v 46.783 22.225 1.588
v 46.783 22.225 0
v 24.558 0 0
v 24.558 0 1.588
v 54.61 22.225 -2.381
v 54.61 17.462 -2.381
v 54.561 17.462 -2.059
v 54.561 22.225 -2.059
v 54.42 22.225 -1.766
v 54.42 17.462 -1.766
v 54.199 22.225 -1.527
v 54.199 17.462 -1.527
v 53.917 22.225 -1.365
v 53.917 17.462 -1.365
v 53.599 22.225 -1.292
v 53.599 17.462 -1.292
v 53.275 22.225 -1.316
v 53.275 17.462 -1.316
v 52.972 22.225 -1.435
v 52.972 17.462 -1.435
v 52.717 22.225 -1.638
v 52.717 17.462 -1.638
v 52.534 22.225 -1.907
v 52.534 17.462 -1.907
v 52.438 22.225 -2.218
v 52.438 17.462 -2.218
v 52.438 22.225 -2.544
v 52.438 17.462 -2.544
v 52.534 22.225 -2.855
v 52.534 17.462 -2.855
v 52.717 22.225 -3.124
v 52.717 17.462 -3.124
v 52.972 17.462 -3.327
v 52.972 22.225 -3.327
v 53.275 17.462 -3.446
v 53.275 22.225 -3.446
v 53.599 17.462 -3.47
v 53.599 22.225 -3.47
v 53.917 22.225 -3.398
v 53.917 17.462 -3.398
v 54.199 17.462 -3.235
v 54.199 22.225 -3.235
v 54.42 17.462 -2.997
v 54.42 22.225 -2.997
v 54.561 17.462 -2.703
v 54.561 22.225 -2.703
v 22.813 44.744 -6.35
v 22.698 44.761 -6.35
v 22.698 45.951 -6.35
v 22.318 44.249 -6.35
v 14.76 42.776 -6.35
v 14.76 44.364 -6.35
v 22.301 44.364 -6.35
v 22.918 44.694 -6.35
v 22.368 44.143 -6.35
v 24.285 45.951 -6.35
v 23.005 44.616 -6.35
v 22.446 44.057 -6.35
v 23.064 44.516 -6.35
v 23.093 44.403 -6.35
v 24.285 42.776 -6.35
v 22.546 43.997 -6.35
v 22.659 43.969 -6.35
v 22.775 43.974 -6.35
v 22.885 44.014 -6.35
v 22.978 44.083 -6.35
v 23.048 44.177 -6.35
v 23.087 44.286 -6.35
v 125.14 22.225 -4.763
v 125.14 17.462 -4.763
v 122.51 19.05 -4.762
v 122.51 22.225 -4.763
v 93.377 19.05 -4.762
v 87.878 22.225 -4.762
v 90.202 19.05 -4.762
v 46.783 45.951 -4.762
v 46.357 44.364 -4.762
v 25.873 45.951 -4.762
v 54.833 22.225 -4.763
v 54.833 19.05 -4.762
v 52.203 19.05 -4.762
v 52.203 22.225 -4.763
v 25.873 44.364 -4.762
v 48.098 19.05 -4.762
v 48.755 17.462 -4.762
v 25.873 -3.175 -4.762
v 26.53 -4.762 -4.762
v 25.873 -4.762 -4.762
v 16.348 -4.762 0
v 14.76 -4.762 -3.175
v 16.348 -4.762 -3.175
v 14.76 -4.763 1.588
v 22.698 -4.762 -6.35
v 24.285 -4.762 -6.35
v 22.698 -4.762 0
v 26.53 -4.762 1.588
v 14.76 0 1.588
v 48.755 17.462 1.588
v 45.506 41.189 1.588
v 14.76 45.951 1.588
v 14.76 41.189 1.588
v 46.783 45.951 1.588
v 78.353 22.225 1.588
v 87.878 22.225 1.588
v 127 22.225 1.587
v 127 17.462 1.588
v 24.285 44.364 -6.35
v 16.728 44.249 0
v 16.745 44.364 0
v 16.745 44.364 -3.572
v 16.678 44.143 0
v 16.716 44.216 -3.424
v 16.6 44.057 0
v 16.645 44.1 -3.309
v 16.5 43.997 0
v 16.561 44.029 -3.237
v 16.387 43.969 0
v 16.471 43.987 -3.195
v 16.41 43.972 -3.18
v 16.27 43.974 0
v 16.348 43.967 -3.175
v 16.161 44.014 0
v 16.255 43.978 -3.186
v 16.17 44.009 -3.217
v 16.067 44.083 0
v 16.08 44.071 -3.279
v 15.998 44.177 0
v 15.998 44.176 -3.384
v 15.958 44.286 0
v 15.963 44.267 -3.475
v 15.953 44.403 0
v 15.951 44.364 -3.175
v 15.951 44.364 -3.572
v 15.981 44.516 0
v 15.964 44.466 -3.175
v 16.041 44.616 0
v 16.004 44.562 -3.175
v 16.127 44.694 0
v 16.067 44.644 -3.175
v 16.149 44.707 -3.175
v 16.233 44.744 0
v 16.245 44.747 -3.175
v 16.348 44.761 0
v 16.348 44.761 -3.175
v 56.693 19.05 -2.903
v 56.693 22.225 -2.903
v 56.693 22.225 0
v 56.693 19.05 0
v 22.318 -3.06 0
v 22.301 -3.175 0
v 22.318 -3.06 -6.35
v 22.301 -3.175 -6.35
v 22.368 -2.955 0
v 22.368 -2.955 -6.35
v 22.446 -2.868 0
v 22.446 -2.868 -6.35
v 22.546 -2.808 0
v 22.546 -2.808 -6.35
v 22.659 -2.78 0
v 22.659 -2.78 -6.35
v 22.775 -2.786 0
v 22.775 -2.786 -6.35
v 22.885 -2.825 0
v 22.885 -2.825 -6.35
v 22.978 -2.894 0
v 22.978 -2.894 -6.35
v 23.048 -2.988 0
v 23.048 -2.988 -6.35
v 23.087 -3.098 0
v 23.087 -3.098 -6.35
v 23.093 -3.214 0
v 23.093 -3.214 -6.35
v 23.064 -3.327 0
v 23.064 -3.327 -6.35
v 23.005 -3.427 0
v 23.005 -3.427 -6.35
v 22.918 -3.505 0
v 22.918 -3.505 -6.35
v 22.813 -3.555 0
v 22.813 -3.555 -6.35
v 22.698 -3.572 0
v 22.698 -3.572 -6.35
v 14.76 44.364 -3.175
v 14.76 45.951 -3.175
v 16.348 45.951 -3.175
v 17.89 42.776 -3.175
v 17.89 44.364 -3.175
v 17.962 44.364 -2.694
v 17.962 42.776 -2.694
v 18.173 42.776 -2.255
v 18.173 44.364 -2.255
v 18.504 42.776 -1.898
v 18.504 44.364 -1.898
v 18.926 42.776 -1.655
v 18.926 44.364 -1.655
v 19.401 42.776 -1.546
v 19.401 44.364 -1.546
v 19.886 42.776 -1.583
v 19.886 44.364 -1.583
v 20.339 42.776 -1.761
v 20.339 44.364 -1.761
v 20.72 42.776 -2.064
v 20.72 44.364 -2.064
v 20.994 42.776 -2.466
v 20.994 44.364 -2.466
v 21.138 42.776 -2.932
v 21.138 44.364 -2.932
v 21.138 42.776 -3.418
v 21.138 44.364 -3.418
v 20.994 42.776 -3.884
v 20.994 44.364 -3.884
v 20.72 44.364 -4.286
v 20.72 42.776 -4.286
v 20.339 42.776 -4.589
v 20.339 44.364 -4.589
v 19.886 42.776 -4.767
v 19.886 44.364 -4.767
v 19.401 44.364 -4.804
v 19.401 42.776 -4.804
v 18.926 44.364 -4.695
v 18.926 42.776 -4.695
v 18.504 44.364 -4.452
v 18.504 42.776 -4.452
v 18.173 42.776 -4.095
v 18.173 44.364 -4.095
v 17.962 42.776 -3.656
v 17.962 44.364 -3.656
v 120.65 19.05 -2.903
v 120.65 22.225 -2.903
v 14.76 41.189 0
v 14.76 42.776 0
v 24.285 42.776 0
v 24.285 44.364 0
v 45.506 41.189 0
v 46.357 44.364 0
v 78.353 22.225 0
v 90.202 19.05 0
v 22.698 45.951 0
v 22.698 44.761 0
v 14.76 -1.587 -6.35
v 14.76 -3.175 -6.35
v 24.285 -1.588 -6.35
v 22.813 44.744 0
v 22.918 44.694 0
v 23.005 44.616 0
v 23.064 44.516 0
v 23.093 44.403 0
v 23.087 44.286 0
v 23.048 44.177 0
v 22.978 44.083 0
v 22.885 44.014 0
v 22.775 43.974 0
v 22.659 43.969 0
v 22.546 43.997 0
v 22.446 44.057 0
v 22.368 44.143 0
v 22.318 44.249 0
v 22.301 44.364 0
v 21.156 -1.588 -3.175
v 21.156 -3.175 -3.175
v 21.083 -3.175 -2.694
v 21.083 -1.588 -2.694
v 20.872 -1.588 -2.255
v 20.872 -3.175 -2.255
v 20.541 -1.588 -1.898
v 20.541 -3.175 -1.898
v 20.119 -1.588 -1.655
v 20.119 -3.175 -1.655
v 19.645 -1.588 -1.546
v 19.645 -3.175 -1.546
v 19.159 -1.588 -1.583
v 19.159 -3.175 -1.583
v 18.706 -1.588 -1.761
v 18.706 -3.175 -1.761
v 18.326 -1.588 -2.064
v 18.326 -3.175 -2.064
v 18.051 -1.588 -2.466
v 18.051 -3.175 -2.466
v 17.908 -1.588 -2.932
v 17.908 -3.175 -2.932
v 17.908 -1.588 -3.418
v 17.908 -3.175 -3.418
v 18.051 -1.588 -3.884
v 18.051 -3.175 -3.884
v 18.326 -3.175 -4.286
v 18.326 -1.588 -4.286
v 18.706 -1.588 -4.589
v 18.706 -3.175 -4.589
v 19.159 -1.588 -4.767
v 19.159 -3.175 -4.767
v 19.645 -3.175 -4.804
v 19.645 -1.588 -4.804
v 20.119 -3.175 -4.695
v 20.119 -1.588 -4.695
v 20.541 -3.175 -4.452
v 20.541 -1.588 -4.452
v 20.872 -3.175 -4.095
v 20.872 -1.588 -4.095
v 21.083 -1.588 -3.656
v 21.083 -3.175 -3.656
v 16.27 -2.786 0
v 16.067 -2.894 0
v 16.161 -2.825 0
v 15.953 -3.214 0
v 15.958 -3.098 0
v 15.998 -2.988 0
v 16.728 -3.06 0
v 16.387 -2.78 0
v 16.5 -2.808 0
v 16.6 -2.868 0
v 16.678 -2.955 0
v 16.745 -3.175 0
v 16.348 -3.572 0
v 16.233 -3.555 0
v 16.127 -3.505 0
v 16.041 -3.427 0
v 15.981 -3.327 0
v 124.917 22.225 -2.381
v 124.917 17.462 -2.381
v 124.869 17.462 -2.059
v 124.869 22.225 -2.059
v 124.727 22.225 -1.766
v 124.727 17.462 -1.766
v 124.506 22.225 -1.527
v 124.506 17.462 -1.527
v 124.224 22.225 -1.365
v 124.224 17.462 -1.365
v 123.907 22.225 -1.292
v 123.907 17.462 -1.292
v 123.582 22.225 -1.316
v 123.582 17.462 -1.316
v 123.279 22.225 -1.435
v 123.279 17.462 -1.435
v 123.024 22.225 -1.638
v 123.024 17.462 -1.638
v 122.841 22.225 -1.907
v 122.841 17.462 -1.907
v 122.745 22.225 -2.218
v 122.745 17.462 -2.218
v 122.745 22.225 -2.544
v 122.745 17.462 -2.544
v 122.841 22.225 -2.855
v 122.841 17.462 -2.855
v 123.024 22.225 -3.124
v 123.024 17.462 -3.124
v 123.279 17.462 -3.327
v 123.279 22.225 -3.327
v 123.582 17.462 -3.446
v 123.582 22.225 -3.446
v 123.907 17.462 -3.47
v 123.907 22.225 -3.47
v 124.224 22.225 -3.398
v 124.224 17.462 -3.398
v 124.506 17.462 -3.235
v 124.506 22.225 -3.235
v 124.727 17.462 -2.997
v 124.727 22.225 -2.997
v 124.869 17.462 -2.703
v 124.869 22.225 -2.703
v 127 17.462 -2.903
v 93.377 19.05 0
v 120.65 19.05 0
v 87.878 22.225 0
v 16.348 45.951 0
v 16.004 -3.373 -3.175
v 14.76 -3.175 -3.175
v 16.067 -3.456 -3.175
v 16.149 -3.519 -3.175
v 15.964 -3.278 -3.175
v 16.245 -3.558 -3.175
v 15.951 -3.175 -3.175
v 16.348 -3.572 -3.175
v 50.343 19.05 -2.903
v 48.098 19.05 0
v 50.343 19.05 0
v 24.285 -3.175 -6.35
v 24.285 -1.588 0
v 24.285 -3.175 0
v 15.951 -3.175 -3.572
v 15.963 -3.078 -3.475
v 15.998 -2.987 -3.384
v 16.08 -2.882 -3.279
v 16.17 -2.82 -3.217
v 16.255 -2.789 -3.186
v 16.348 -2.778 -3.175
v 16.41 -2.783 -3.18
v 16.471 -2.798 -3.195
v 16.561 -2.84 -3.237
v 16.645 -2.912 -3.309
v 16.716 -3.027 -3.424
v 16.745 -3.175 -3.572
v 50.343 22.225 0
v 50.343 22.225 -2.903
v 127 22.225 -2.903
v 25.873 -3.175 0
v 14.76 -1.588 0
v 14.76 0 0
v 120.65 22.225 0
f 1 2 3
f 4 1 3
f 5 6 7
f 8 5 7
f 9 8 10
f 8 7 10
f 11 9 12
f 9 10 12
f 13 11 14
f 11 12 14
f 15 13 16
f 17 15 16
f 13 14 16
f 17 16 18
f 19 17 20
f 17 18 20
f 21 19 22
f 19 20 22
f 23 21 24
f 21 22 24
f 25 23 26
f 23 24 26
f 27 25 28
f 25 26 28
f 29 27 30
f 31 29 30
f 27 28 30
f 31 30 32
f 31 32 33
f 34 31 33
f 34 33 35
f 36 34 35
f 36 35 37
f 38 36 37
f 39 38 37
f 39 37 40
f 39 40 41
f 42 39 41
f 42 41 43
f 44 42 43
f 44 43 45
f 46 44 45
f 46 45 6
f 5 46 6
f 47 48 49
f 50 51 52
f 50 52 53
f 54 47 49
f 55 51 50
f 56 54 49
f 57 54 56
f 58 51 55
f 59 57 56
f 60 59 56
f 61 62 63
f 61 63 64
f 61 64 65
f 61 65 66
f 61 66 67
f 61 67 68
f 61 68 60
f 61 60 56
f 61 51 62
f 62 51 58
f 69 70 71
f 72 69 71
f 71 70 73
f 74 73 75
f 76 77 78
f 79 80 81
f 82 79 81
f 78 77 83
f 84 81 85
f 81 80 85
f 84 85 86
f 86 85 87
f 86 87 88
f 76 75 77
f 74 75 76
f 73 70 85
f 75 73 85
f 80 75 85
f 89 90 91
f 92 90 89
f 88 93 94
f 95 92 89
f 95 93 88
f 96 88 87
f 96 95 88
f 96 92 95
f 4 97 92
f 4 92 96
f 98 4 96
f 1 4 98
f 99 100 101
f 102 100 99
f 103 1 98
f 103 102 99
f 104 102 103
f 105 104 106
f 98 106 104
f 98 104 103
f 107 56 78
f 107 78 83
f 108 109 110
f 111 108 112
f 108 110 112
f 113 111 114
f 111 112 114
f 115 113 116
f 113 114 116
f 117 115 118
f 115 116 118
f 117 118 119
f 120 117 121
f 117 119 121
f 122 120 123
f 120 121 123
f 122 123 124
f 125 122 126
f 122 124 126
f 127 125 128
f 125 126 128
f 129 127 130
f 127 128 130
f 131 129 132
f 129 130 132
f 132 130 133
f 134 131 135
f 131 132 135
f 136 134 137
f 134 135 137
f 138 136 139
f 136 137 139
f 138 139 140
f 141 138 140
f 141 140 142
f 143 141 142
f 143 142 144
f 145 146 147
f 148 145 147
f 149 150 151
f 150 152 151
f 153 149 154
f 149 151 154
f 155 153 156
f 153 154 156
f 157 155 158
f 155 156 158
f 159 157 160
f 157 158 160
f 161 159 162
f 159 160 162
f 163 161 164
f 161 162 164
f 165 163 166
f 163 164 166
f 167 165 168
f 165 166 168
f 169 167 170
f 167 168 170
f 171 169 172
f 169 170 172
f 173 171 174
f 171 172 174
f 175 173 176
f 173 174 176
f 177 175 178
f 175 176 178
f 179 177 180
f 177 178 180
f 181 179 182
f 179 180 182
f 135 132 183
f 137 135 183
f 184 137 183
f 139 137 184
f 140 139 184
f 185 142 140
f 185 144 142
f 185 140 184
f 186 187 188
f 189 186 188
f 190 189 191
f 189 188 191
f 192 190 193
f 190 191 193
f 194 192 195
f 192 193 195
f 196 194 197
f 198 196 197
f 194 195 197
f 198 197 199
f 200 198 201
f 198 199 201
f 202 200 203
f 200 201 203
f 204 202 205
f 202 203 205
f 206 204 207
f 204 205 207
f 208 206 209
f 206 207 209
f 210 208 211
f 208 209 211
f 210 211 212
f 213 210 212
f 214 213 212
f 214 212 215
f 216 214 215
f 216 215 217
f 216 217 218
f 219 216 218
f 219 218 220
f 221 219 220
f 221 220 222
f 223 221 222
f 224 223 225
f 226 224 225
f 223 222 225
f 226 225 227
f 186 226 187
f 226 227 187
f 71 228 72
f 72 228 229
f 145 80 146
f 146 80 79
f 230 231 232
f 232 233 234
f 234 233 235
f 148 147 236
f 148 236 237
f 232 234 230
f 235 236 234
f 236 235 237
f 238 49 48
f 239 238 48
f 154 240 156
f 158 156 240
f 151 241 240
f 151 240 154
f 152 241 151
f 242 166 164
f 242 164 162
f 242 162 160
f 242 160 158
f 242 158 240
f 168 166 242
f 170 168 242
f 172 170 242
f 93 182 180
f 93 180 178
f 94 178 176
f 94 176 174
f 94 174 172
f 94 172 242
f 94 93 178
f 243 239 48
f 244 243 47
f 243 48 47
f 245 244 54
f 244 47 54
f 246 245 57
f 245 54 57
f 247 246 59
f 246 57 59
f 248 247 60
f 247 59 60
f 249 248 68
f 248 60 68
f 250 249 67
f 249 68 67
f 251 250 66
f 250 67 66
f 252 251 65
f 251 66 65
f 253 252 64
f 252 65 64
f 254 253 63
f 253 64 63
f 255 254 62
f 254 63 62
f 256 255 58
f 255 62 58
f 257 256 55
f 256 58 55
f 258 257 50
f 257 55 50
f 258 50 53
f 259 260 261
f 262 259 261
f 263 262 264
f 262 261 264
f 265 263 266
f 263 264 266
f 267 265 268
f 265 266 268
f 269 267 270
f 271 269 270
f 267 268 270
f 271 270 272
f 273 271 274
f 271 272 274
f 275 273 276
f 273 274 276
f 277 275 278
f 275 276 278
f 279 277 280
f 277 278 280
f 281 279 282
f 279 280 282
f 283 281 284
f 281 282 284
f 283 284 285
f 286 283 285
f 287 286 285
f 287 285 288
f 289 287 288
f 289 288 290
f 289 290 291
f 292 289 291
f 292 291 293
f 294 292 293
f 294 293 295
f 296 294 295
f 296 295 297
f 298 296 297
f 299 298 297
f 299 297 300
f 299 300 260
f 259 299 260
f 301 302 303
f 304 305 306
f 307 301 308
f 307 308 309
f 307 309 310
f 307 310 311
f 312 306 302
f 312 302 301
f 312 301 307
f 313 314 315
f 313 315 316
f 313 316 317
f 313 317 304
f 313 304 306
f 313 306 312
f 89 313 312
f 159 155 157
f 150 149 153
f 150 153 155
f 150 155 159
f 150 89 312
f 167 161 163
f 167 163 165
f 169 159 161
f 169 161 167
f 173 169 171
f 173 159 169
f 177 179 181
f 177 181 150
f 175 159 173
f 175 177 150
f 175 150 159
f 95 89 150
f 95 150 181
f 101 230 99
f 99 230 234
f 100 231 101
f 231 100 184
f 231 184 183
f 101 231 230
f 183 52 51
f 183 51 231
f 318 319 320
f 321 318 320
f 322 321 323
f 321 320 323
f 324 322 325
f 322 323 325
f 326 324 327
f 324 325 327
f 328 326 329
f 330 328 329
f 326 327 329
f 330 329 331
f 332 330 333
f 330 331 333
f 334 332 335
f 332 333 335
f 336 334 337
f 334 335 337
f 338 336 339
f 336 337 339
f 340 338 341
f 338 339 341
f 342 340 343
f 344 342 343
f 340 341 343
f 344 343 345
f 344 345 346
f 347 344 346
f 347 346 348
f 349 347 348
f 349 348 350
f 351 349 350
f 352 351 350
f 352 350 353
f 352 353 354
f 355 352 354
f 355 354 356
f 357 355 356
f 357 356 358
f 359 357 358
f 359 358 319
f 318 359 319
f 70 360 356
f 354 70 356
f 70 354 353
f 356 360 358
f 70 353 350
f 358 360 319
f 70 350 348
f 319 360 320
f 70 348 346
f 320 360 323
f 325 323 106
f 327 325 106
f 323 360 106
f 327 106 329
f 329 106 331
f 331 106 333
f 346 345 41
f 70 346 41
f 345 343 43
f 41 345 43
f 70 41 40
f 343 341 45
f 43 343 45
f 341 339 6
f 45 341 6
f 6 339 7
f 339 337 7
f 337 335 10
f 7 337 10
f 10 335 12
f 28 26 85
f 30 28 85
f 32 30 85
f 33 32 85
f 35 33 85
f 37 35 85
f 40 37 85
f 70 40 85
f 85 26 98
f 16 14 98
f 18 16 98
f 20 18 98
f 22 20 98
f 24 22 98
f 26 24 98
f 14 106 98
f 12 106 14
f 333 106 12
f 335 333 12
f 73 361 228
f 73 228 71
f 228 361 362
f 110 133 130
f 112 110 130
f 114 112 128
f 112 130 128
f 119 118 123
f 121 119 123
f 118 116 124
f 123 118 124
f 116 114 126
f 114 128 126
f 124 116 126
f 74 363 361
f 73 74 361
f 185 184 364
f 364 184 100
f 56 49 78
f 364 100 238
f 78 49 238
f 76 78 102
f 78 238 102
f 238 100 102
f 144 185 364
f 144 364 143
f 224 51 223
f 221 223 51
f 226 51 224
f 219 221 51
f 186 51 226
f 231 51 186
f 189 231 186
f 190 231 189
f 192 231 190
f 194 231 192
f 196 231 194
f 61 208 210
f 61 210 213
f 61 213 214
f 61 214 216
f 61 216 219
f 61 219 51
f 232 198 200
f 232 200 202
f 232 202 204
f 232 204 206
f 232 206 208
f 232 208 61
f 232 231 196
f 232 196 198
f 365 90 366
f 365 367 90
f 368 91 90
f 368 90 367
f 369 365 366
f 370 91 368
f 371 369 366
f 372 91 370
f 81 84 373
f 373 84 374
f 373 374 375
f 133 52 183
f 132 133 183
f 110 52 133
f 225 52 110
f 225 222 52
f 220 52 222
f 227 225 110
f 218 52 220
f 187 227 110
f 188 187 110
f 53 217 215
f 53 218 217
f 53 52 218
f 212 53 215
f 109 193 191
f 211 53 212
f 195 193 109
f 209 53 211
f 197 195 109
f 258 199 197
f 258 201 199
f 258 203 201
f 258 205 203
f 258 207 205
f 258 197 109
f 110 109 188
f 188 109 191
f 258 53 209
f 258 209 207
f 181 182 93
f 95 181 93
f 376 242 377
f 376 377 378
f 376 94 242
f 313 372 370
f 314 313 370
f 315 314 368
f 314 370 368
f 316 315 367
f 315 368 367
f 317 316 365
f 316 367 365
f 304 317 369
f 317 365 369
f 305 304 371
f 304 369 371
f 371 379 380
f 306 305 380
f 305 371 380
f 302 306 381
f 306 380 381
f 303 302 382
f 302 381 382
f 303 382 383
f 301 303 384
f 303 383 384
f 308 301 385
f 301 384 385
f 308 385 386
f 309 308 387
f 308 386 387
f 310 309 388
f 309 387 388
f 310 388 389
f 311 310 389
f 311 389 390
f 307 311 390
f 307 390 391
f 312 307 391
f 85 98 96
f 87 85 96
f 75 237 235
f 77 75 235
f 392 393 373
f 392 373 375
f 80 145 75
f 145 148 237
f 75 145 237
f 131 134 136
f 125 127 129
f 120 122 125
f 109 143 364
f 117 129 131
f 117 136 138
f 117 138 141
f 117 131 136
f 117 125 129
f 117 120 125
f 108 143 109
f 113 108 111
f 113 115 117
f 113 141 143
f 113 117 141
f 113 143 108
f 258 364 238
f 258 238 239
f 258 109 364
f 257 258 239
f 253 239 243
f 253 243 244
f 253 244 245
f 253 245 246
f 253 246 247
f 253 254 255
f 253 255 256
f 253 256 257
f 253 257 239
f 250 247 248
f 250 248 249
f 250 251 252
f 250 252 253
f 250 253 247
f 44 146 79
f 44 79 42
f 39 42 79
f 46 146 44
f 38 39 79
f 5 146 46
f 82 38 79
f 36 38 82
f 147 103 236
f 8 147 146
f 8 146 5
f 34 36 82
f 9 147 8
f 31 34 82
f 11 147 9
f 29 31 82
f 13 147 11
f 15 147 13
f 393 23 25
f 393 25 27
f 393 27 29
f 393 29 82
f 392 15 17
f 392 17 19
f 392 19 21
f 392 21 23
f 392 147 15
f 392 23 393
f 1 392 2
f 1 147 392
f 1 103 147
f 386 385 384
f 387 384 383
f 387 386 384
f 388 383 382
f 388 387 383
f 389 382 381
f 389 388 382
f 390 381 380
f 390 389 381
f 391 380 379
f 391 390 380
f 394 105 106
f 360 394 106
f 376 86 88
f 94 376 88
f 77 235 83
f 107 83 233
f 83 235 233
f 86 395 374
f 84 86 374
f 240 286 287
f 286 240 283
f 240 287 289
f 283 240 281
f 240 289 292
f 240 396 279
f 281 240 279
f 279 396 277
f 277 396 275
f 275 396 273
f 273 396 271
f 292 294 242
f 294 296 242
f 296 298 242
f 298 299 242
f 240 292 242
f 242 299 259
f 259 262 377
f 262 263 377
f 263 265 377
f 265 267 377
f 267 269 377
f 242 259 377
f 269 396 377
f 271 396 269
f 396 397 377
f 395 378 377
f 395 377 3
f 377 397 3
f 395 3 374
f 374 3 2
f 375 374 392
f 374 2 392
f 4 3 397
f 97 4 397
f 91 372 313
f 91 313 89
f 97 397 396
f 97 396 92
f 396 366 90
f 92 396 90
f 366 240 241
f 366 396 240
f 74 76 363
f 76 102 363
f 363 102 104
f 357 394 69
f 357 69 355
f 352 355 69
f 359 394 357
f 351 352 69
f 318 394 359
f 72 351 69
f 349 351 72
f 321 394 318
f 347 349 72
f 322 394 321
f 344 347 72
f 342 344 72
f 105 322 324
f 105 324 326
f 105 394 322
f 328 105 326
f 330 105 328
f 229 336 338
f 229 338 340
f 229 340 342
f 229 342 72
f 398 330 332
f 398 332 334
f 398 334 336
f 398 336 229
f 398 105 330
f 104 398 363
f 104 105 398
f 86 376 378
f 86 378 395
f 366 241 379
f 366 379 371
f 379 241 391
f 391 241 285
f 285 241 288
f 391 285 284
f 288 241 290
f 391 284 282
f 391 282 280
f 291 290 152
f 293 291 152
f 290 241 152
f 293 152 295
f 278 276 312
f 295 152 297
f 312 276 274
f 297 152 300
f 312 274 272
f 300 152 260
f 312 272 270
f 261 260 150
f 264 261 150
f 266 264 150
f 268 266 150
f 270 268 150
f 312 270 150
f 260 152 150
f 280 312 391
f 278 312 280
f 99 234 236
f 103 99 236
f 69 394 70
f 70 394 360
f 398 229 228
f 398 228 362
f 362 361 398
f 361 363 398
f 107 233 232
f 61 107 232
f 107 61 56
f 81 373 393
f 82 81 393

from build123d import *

# Parameters (mm, degrees)
F1_DEPTH      = 1.5875
F3_DEPTH      = 4.7625
F4_W          = 6.35
F4_H          = 6.35
F4_W_2        = 4.7625
F4_H_2        = 4.7625
F5_DEPTH      = 3.175
F6_SIZE       = 1.8598642
F7_W          = 28.575
F7_H          = 3.175
F8_DEPTH      = 1.5875
F9_W          = 6.35
F9_H          = 1.5875
F10_DEPTH     = 6.35
F11_R         = 1.0922
F11_R_2       = 1.63322
F12_DEPTH     = 25.4
F13_SIZE      = 1.58749
F14_R         = 0.396875
F15_DEPTH     = 6.35
F16_R         = 1.63322
F17_DEPTH     = 1.5875
F18_W         = 141.7602359697
F18_H         = 50.7137336135
F19_DEPTH     = 7.9375
F20_W         = 1.5875
F20_H         = 3.175
F21_DEPTH     = 1.5875
F22_R         = 0.396875
F23_DEPTH     = 3.175
F24_T4_DEPTH  = 1.4175116858
F24_S5_R      = 0.396875
F24_T6_DEPTH  = 2
F24_T10_DEPTH = 1.4175116858
F24_S11_R     = 0.396875
F24_T12_DEPTH = 2
F24_T16_DEPTH = 2.8350233717
F24_S17_R     = 0.396875
F24_T18_DEPTH = 3


# Not quite as in the source:
# - a fillet or chamfer that OpenCascade refuses, or shapes differently, is made with other operations: its cross-section is extruded or revolved along the edge and cut away or added
# - a fillet or chamfer is up to 0.001 mm smaller than in the source, because OpenCascade refuses the exact size


with BuildPart() as f1:
    # F0 (on Top) → F1 (new body)
    with BuildSketch(Plane.XY):
        Polygon((-87.87765, 22.225), (-127, 22.225), (-127, 17.4625), (-48.7553, 17.4625), (-26.5303, -4.7625), (26.5303, -4.7625), (48.7553, 17.4625), (127, 17.4625), (127, 22.225), (87.87765, 22.225), (46.7826079092, 45.9512336135), (-46.7826079092, 45.9512336135), align=None)
        Polygon((-24.5576079092, 0), (-46.7826079092, 22.225), (-78.35265, 22.225), (-45.5064998802, 41.1887336135), (45.5064998802, 41.1887336135), (78.35265, 22.225), (46.7826079092, 22.225), (24.5576079092, 0), align=None, mode=Mode.SUBTRACT)
    extrude(amount=F1_DEPTH)

    # F2 (on face) → F3 (join)
    with BuildSketch(Plane(origin=(0, 0, 0), x_dir=(1, 0, 0), z_dir=(0, 0, -1))):
        Polygon((-48.7553, -17.4625), (-127, -17.4625), (-127, -19.05), (-93.376911314, -19.05), (-87.87765, -22.225), (-46.7826079092, -45.9512336135), (46.7826079092, -45.9512336135), (87.87765, -22.225), (93.376911314, -19.05), (127, -19.05), (127, -17.4625), (48.7553, -17.4625), (26.5303, 4.7625), (-26.5303, 4.7625), align=None)
        Polygon((-48.0977359697, -19.05), (-25.8727359697, 3.175), (-4.2897640303, 3.175), (-4.2897640303, 1.5875), (24.2852359697, 1.5875), (24.2852359697, 3.175), (25.8727359697, 3.175), (48.0977359697, -19.05), (90.201911314, -19.05), (46.3572385662, -44.3637336135), (24.2852359697, -44.3637336135), (24.2852359697, -42.7762336135), (-4.2897640303, -42.7762336135), (-4.2897640303, -44.3637336135), (-46.3572385662, -44.3637336135), (-90.201911314, -19.05), align=None, mode=Mode.SUBTRACT)
    extrude(amount=F3_DEPTH)

    # F4 (on face) → F5 (join, through all)
    with BuildSketch(Plane(origin=(0, 19.05, 0), x_dir=(-1, 0, 0), z_dir=(0, 1, 0))):
        with Locations((-53.5178, -1.5875)):
            Rectangle(F4_W, F4_H)
        with Locations((-123.825, -1.5875)):
            Rectangle(F4_W, F4_H)
        with Locations((124.61875, -2.38125)):
            Rectangle(F4_W_2, F4_H_2)
        with Locations((55.89905, -2.38125)):
            Rectangle(F4_W_2, F4_H_2)
    extrude(amount=F5_DEPTH)

    # F6
    f6_edges = [f1.edges().sort_by_distance(p)[0] for p in [
        (-127, 19.84375, -4.7625),
        (-122.2375, 20.6375, -4.7625),
        (-58.2803, 20.6375, -4.7625),
        (-53.5178, 20.6375, -4.7625),
        (50.3428, 20.6375, -4.7625),
        (56.6928, 20.6375, -4.7625),
        (120.65, 20.6375, -4.7625),
        (127, 19.84375, -4.7625),
    ]]
    chamfer(f6_edges, length=F6_SIZE)

    # F7 (on face) → F8 (join)
    with BuildSketch(Plane(origin=(0, 0, -4.7625), x_dir=(1, 0, 0), z_dir=(0, 0, -1))):
        with Locations((9.9977359697, 3.175)):
            Rectangle(F7_W, F7_H)
        with Locations((9.9977359697, -44.3637336135)):
            Rectangle(F7_W, F7_H)
    extrude(amount=F8_DEPTH)

    # F9 (on face) → F10 (cut, through all)
    with BuildSketch(Plane(origin=(0, 0, -6.35), x_dir=(1, 0, 0), z_dir=(0, 0, -1))):
        with Locations((19.5227359697, 3.96875)):
            Rectangle(F9_W, F9_H)
        with Locations((19.5227359697, -45.1574836135)):
            Rectangle(F9_W, F9_H)
    extrude(amount=-F10_DEPTH, mode=Mode.SUBTRACT)

    # F11 (on face) → F12 (cut, through all)
    with BuildSketch(Plane.XZ.offset(3.175)):
        with Locations((53.5178, -2.38125)):
            Circle(F11_R)
        with Locations((123.825, -2.38125)):
            Circle(F11_R)
        with Locations((-124.61875, -2.38125)):
            Circle(F11_R)
        with Locations((-55.89905, -2.38125)):
            Circle(F11_R)
        with Locations((19.5227359697, -3.175)):
            Circle(F11_R_2)
    extrude(amount=-F12_DEPTH, mode=Mode.SUBTRACT)

    # F13 (size 1.5875 in the source; OpenCascade refuses exactly that, so slightly less here)
    f13_edges = [f1.edges().sort_by_distance(p)[0] for p in [
        (-4.289764, -3.96875, -4.7625),
        (24.285236, -3.96875, -4.7625),
        (-4.289764, 45.157484, -4.7625),
        (24.285236, 45.157484, -4.7625),
    ]]
    chamfer(f13_edges, length=F13_SIZE)

    # F14 (on face) → F15 (cut, through all)
    with BuildSketch(Plane(origin=(0, 0, -6.35), x_dir=(1, 0, 0), z_dir=(0, 0, -1))):
        with Locations((22.6977359697, 3.175)):
            Circle(F14_R)
        with Locations((22.6977359697, -44.3637336135)):
            Circle(F14_R)
    extrude(amount=-F15_DEPTH, mode=Mode.SUBTRACT)

    # F16 (on face) → F17 (cut, through all)
    with BuildSketch(Plane(origin=(0, 44.3637336135, 0), x_dir=(-1, 0, 0), z_dir=(0, 1, 0))):
        with Locations((-19.5227359697, -3.175)):
            Circle(F16_R)
    extrude(amount=-F17_DEPTH, mode=Mode.SUBTRACT)

    # F18 (on face) → F19 (cut, through all)
    with BuildSketch(Plane(origin=(0, 0, -6.35), x_dir=(1, 0, 0), z_dir=(0, 0, -1))):
        with Locations((-56.1198820151, -20.5943668067)):
            Rectangle(F18_W, F18_H)
    extrude(amount=-F19_DEPTH, mode=Mode.SUBTRACT)

    # F20 (on face) → F21 (cut, through all)
    with BuildSketch(Plane.YZ.offset(16.3477359697)):
        with Locations((-3.96875, -4.7625)):
            Rectangle(F20_W, F20_H)
        with Locations((45.1574836135, -4.7625)):
            Rectangle(F20_W, F20_H)
    extrude(amount=-F21_DEPTH, mode=Mode.SUBTRACT)

    # F22 (on face) → F23 (cut, through all)
    with BuildSketch(Plane(origin=(0, 0, -3.175), x_dir=(1, 0, 0), z_dir=(0, 0, -1))):
        with Locations((16.3477359697, -44.3637336135)):
            Circle(F22_R)
        with Locations((16.3477359697, 3.175)):
            Circle(F22_R)
    extrude(amount=-F23_DEPTH, mode=Mode.SUBTRACT)

    # F24: chamfer of 0.396875 on 3 edges, made by hand


with BuildPart() as f24_tool2:
    # F24_s3 → F24_t4 (new body)
    with BuildSketch(Plane.YZ.offset(17.7652476556)):
        Polygon((-2.778125, -3.175), (-3.175, -3.571875), (-3.175, -3.175), align=None)
    extrude(amount=-F24_T4_DEPTH)

    # F24_s5 → F24_t6 (intersect, symmetric)
    with BuildSketch(Plane.XY.offset(-3.4)):
        with Locations((16.3477359697, -3.175)):
            Circle(F24_S5_R)
    extrude(amount=F24_T6_DEPTH, both=True, mode=Mode.INTERSECT)


with BuildPart() as f1_1:
    add(f1.part)

    # F24_t1: cut F24_tool2
    add(f24_tool2.part, mode=Mode.SUBTRACT)


with BuildPart() as f24_tool8:
    # F24_s9 → F24_t10 (new body)
    with BuildSketch(Plane.YZ.offset(16.3477359697)):
        Polygon((-2.778125, -3.175), (-3.175, -3.571875), (-3.175, -3.175), align=None)
    extrude(amount=-F24_T10_DEPTH)

    # F24_s11 → F24_t12 (intersect, symmetric)
    with BuildSketch(Plane.XY.offset(-3.4)):
        with Locations((16.3477359697, -3.175)):
            Circle(F24_S11_R)
    extrude(amount=F24_T12_DEPTH, both=True, mode=Mode.INTERSECT)


with BuildPart() as f1_2:
    add(f1_1.part)

    # F24_t7: cut F24_tool8
    add(f24_tool8.part, mode=Mode.SUBTRACT)


with BuildPart() as f24_tool14:
    # F24_s15 → F24_t16 (new body)
    with BuildSketch(Plane.YZ.offset(14.9302242839)):
        Polygon((44.3637336135, -3.571875), (43.9668586135, -3.175), (44.3637336135, -3.175), align=None)
    extrude(amount=F24_T16_DEPTH)

    # F24_s17 → F24_t18 (intersect, symmetric)
    with BuildSketch(Plane.XY.offset(-3.4)):
        with Locations((16.3477359697, 44.3637336135)):
            Circle(F24_S17_R)
    extrude(amount=F24_T18_DEPTH, both=True, mode=Mode.INTERSECT)


with BuildPart() as f1_3:
    add(f1_2.part)

    # F24_t13: cut F24_tool14
    add(f24_tool14.part, mode=Mode.SUBTRACT)


solid = f1_3.part
